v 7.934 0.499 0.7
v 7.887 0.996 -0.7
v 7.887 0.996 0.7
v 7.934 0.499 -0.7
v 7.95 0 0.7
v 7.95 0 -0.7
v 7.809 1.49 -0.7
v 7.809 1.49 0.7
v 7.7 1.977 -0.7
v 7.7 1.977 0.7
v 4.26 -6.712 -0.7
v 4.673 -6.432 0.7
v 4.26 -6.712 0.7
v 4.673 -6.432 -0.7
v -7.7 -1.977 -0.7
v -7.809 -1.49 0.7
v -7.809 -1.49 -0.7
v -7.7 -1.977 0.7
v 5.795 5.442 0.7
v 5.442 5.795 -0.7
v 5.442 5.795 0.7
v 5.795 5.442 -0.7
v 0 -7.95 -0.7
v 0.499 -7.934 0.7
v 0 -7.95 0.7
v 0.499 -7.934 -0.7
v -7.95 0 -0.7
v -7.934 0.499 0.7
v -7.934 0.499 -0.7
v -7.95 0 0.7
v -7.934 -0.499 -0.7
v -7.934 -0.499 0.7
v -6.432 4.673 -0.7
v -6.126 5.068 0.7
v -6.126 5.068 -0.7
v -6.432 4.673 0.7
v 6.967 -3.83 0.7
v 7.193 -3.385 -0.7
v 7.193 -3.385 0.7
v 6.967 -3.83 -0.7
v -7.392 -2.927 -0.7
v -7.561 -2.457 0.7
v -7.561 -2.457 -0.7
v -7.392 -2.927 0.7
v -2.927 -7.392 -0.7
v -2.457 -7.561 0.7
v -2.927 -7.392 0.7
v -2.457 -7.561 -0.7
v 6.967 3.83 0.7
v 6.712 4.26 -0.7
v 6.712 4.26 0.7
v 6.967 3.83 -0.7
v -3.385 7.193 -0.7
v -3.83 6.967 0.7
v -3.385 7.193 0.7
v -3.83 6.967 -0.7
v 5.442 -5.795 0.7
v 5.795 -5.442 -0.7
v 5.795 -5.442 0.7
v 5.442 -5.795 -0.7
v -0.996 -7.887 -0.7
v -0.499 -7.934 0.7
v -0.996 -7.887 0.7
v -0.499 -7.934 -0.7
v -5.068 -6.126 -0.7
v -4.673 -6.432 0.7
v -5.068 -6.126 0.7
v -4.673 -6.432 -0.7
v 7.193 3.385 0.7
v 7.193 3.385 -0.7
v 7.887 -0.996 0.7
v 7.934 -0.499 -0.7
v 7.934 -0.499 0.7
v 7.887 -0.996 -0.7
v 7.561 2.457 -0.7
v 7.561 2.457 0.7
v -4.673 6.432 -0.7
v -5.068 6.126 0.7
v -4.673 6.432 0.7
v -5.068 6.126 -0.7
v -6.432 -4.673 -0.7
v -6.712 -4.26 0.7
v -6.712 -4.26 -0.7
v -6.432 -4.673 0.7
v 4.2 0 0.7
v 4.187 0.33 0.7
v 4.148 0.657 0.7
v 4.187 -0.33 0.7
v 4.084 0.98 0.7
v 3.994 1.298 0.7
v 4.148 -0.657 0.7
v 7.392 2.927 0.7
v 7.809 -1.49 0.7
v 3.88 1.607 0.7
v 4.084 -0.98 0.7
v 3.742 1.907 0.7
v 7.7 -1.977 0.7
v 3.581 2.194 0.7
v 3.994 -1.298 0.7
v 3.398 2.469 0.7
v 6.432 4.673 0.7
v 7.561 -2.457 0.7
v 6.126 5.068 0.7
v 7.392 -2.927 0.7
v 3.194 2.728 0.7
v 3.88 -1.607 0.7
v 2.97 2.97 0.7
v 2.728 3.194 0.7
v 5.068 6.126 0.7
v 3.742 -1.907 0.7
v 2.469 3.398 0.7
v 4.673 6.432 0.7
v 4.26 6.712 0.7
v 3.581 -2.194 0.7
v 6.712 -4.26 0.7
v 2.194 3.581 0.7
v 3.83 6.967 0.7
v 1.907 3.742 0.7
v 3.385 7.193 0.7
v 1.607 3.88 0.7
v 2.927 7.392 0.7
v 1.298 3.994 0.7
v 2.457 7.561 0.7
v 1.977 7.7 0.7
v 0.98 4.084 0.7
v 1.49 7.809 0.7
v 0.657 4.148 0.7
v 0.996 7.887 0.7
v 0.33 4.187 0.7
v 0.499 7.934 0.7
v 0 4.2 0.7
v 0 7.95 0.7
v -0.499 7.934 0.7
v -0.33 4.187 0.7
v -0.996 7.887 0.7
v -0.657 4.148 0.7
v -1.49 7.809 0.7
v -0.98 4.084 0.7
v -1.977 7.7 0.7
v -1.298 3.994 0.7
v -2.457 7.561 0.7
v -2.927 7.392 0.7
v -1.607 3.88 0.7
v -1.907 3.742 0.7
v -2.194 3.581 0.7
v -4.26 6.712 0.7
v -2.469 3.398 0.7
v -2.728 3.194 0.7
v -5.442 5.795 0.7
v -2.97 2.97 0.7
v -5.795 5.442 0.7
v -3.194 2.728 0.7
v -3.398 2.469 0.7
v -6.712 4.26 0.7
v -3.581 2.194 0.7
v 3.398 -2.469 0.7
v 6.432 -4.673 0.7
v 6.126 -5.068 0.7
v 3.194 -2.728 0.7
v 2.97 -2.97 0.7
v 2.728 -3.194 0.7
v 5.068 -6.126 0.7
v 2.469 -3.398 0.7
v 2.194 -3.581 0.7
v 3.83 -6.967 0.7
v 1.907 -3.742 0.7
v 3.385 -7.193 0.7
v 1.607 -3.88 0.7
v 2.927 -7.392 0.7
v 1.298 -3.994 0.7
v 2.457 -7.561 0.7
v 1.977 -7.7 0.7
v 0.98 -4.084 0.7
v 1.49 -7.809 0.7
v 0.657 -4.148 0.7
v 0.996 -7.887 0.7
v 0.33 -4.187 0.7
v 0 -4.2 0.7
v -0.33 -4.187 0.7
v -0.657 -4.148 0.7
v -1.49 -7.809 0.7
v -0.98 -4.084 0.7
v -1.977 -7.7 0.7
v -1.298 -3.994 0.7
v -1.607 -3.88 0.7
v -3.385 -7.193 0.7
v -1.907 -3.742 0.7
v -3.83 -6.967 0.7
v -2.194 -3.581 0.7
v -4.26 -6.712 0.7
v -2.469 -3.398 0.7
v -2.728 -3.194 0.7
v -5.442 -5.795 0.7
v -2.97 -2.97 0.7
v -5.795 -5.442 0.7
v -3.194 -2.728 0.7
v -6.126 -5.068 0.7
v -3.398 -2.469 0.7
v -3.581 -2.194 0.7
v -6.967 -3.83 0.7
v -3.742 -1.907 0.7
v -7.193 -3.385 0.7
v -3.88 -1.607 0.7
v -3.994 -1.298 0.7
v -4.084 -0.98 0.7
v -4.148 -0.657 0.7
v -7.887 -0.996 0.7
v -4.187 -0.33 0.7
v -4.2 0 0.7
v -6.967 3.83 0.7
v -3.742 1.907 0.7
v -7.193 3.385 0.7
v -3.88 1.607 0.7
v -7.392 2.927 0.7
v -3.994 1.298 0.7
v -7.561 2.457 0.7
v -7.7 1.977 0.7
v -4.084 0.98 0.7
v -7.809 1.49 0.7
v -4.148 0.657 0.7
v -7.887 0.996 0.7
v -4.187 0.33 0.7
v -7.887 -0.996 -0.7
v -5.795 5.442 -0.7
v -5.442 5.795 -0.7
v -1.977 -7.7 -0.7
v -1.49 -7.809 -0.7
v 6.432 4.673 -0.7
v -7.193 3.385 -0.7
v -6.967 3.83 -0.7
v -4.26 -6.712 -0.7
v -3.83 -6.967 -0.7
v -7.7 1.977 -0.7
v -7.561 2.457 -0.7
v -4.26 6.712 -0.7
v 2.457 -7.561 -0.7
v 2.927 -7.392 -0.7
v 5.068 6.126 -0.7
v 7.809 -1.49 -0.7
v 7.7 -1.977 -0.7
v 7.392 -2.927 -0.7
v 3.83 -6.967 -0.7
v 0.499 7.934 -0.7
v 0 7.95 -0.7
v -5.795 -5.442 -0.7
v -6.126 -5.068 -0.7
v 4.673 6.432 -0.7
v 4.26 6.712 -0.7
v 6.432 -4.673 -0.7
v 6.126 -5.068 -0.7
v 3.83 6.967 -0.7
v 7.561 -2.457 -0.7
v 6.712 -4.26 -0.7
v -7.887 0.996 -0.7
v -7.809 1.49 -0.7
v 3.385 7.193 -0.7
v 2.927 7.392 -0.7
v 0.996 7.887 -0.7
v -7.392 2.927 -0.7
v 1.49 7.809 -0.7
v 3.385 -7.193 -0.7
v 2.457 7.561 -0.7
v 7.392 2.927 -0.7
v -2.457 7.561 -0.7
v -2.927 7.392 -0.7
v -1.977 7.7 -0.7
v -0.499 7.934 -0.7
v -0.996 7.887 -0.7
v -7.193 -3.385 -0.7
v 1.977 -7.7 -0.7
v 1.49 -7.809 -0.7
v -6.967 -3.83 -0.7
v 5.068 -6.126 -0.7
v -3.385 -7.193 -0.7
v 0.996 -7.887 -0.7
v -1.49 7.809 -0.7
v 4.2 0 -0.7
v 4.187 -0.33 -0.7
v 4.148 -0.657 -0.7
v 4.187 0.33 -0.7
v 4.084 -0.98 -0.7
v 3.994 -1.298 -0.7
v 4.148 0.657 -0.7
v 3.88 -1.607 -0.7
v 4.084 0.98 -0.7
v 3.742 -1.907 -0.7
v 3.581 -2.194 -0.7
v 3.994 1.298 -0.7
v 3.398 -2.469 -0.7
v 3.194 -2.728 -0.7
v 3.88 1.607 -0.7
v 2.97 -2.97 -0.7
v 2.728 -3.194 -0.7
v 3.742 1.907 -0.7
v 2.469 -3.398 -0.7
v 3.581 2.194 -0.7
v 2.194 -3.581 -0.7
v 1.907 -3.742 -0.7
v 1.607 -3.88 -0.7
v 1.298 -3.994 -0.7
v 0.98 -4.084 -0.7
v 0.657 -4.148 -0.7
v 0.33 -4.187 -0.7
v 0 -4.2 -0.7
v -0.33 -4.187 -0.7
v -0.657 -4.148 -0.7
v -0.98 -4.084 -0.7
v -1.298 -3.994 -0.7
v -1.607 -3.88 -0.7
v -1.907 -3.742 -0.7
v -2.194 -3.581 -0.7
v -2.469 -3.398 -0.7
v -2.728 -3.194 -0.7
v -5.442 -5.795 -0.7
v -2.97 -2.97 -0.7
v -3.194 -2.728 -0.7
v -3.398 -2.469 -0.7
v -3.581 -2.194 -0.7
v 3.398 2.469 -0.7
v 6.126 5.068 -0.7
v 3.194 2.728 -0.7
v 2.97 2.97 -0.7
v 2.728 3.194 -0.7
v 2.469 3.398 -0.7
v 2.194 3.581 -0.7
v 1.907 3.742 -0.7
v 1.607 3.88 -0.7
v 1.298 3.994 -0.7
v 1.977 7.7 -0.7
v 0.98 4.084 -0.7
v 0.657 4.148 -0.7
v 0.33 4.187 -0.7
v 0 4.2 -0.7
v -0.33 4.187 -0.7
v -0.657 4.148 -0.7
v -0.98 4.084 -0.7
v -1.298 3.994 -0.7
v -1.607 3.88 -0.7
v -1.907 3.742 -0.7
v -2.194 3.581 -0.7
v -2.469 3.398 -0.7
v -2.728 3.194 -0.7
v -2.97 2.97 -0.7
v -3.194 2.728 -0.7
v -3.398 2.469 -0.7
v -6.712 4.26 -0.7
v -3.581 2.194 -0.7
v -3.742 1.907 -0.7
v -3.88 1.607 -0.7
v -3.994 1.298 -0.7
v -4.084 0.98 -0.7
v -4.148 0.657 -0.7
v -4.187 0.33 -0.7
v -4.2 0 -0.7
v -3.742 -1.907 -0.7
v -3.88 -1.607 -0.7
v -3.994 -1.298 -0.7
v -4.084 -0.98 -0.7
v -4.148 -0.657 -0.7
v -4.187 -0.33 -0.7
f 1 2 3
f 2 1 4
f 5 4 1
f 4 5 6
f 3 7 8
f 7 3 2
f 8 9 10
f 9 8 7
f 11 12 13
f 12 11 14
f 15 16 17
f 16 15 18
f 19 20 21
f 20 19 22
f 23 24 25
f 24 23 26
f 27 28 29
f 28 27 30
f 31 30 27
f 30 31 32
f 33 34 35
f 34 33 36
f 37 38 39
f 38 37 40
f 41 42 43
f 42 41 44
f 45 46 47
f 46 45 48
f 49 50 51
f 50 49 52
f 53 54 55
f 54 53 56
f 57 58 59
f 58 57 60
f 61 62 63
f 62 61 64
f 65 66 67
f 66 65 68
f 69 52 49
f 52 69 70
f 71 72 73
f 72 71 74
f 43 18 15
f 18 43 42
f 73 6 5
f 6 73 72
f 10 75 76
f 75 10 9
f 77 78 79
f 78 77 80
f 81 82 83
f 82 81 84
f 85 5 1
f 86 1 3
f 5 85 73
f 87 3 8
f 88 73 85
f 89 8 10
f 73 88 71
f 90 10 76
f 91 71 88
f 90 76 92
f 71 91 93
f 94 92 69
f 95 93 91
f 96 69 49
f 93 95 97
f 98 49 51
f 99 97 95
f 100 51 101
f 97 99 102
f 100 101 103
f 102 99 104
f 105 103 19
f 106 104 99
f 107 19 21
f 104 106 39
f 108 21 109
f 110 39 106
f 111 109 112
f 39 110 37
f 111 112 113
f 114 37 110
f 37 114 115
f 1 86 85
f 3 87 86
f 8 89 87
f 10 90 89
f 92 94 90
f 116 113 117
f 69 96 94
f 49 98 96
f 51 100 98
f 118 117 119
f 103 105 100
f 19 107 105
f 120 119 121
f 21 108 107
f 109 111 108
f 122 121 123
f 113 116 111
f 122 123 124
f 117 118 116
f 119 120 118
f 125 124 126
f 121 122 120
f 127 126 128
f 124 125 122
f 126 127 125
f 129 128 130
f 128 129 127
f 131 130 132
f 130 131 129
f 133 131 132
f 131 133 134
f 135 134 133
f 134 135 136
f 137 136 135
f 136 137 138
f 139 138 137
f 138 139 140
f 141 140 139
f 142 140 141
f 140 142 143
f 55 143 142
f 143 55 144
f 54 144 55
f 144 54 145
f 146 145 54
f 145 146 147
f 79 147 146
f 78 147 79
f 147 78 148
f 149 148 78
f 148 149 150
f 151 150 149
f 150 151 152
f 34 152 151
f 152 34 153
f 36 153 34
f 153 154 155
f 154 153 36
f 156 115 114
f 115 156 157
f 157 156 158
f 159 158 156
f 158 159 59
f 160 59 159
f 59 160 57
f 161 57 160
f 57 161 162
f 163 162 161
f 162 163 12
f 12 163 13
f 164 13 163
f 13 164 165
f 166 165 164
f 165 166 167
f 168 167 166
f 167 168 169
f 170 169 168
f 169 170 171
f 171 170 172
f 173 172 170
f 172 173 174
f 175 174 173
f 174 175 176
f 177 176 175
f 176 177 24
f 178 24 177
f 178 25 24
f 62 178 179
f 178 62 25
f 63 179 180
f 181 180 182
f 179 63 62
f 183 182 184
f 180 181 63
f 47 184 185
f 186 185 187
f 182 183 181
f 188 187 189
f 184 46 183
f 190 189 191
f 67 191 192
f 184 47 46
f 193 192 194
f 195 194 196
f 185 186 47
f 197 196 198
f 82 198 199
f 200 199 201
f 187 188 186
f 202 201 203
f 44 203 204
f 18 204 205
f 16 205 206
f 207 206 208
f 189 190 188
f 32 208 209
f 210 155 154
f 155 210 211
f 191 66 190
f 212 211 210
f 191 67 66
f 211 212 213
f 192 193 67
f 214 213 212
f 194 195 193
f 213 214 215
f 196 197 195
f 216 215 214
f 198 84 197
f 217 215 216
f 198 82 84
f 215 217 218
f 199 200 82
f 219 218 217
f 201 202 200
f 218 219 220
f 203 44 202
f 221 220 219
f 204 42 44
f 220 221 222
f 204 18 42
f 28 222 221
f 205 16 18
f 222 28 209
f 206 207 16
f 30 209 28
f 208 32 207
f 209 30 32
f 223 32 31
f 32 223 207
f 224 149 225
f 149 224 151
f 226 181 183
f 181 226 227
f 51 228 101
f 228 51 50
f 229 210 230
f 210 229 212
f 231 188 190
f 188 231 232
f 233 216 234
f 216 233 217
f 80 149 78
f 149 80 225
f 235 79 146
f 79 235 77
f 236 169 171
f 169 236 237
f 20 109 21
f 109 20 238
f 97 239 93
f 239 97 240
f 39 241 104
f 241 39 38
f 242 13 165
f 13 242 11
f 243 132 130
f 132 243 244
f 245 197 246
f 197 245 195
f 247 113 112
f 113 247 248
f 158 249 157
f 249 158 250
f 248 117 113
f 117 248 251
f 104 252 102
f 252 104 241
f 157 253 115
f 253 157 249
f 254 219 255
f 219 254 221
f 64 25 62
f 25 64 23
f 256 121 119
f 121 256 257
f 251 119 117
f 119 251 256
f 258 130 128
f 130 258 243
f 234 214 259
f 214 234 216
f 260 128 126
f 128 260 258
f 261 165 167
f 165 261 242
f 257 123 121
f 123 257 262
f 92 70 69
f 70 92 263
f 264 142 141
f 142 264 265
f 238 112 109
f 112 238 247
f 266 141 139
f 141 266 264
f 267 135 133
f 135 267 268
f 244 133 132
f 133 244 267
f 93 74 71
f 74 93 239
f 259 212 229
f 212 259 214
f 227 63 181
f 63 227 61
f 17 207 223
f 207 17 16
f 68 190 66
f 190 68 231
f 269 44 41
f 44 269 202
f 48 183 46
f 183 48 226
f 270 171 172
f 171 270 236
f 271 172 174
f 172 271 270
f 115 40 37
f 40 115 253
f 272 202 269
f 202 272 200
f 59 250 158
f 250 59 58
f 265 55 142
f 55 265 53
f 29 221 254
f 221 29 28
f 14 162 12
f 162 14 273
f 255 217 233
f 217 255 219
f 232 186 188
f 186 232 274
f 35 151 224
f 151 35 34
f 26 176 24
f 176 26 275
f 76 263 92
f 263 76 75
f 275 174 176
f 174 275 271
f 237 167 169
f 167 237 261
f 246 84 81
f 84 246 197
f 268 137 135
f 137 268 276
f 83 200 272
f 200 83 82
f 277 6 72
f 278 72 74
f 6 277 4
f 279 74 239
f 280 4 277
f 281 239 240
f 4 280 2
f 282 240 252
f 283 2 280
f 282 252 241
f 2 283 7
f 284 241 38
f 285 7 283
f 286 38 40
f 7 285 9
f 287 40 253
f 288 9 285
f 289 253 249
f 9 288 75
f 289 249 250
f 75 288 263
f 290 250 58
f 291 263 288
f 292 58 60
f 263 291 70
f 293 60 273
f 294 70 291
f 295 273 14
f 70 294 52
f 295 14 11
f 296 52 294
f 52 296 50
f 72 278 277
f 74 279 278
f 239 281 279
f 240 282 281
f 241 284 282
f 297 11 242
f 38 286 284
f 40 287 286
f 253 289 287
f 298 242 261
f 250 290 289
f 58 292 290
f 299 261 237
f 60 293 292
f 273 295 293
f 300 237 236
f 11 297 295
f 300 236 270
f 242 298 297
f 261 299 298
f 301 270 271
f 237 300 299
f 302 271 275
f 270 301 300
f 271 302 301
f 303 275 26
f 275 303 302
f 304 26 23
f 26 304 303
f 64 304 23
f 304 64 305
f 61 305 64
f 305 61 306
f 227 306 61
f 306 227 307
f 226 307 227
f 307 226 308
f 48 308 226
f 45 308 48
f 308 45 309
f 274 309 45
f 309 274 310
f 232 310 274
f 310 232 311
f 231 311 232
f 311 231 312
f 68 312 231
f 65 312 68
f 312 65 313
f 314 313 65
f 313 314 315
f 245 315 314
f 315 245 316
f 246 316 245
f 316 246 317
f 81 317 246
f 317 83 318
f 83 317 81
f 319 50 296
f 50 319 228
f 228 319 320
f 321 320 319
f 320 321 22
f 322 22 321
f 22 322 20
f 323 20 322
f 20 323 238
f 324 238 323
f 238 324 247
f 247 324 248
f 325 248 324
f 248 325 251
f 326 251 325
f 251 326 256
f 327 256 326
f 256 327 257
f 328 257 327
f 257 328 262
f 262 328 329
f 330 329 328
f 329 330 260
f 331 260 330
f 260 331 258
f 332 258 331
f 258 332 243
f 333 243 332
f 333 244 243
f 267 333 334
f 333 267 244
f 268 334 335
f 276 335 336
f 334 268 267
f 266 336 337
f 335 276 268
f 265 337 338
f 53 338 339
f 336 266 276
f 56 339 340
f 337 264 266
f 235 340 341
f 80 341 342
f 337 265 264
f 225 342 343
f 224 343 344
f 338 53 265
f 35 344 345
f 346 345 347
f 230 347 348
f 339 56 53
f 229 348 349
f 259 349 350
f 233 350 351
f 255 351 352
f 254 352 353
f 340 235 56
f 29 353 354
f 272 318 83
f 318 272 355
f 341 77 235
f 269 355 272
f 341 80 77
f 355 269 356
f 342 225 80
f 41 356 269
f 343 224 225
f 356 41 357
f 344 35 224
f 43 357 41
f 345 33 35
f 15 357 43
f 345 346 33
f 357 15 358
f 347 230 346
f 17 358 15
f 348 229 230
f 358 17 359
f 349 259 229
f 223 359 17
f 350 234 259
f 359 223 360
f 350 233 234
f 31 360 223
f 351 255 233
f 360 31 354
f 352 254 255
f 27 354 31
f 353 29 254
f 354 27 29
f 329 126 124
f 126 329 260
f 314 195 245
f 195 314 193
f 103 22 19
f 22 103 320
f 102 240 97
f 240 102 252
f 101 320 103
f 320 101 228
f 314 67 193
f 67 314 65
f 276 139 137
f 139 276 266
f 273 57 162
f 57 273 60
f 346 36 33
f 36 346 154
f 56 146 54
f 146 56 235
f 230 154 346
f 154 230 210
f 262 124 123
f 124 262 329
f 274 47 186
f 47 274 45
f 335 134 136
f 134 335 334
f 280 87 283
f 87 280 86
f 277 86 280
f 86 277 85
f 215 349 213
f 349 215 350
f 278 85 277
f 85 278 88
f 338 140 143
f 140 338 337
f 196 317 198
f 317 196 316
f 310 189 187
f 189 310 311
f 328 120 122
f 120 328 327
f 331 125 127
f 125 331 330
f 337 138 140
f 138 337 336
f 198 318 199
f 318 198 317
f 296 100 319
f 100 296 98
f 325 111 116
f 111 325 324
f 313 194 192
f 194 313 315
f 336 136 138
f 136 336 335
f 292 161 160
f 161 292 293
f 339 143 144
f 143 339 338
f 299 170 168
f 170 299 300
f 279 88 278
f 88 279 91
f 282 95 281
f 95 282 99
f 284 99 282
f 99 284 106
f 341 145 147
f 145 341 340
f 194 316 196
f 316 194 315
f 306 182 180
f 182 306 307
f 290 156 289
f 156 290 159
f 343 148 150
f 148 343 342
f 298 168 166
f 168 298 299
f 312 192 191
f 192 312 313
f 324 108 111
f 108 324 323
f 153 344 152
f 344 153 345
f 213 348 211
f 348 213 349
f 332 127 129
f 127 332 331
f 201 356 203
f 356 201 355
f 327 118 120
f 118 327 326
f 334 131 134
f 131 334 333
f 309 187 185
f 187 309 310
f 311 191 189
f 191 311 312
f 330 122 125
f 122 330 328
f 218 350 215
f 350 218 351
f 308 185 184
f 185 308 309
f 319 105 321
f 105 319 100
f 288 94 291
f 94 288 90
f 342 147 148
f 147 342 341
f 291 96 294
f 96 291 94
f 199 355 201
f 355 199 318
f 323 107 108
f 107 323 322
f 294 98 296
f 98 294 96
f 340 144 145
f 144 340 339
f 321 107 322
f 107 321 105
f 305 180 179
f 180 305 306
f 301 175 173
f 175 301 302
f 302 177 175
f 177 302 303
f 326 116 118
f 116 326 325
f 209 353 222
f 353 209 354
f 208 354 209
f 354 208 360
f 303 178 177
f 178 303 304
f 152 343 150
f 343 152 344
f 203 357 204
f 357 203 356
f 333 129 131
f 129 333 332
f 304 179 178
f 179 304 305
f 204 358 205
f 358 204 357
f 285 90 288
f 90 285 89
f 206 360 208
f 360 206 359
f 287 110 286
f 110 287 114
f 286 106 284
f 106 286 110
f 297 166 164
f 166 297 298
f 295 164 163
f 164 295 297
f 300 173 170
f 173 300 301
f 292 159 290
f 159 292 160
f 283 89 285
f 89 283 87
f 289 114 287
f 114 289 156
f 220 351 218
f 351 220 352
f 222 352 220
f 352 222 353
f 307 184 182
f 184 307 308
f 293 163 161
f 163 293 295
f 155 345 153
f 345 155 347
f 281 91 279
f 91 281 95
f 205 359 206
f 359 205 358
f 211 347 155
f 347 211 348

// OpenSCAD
washer_diam = 8.4;
washer_th = 1.4;
washer_odiam = 15.9;

difference() {
  cylinder(r = washer_odiam/2, h = washer_th, center = true, $fn = 100);
  cylinder(r = washer_diam/2,  h = washer_th+10, center = true, $fn = 80);
}
